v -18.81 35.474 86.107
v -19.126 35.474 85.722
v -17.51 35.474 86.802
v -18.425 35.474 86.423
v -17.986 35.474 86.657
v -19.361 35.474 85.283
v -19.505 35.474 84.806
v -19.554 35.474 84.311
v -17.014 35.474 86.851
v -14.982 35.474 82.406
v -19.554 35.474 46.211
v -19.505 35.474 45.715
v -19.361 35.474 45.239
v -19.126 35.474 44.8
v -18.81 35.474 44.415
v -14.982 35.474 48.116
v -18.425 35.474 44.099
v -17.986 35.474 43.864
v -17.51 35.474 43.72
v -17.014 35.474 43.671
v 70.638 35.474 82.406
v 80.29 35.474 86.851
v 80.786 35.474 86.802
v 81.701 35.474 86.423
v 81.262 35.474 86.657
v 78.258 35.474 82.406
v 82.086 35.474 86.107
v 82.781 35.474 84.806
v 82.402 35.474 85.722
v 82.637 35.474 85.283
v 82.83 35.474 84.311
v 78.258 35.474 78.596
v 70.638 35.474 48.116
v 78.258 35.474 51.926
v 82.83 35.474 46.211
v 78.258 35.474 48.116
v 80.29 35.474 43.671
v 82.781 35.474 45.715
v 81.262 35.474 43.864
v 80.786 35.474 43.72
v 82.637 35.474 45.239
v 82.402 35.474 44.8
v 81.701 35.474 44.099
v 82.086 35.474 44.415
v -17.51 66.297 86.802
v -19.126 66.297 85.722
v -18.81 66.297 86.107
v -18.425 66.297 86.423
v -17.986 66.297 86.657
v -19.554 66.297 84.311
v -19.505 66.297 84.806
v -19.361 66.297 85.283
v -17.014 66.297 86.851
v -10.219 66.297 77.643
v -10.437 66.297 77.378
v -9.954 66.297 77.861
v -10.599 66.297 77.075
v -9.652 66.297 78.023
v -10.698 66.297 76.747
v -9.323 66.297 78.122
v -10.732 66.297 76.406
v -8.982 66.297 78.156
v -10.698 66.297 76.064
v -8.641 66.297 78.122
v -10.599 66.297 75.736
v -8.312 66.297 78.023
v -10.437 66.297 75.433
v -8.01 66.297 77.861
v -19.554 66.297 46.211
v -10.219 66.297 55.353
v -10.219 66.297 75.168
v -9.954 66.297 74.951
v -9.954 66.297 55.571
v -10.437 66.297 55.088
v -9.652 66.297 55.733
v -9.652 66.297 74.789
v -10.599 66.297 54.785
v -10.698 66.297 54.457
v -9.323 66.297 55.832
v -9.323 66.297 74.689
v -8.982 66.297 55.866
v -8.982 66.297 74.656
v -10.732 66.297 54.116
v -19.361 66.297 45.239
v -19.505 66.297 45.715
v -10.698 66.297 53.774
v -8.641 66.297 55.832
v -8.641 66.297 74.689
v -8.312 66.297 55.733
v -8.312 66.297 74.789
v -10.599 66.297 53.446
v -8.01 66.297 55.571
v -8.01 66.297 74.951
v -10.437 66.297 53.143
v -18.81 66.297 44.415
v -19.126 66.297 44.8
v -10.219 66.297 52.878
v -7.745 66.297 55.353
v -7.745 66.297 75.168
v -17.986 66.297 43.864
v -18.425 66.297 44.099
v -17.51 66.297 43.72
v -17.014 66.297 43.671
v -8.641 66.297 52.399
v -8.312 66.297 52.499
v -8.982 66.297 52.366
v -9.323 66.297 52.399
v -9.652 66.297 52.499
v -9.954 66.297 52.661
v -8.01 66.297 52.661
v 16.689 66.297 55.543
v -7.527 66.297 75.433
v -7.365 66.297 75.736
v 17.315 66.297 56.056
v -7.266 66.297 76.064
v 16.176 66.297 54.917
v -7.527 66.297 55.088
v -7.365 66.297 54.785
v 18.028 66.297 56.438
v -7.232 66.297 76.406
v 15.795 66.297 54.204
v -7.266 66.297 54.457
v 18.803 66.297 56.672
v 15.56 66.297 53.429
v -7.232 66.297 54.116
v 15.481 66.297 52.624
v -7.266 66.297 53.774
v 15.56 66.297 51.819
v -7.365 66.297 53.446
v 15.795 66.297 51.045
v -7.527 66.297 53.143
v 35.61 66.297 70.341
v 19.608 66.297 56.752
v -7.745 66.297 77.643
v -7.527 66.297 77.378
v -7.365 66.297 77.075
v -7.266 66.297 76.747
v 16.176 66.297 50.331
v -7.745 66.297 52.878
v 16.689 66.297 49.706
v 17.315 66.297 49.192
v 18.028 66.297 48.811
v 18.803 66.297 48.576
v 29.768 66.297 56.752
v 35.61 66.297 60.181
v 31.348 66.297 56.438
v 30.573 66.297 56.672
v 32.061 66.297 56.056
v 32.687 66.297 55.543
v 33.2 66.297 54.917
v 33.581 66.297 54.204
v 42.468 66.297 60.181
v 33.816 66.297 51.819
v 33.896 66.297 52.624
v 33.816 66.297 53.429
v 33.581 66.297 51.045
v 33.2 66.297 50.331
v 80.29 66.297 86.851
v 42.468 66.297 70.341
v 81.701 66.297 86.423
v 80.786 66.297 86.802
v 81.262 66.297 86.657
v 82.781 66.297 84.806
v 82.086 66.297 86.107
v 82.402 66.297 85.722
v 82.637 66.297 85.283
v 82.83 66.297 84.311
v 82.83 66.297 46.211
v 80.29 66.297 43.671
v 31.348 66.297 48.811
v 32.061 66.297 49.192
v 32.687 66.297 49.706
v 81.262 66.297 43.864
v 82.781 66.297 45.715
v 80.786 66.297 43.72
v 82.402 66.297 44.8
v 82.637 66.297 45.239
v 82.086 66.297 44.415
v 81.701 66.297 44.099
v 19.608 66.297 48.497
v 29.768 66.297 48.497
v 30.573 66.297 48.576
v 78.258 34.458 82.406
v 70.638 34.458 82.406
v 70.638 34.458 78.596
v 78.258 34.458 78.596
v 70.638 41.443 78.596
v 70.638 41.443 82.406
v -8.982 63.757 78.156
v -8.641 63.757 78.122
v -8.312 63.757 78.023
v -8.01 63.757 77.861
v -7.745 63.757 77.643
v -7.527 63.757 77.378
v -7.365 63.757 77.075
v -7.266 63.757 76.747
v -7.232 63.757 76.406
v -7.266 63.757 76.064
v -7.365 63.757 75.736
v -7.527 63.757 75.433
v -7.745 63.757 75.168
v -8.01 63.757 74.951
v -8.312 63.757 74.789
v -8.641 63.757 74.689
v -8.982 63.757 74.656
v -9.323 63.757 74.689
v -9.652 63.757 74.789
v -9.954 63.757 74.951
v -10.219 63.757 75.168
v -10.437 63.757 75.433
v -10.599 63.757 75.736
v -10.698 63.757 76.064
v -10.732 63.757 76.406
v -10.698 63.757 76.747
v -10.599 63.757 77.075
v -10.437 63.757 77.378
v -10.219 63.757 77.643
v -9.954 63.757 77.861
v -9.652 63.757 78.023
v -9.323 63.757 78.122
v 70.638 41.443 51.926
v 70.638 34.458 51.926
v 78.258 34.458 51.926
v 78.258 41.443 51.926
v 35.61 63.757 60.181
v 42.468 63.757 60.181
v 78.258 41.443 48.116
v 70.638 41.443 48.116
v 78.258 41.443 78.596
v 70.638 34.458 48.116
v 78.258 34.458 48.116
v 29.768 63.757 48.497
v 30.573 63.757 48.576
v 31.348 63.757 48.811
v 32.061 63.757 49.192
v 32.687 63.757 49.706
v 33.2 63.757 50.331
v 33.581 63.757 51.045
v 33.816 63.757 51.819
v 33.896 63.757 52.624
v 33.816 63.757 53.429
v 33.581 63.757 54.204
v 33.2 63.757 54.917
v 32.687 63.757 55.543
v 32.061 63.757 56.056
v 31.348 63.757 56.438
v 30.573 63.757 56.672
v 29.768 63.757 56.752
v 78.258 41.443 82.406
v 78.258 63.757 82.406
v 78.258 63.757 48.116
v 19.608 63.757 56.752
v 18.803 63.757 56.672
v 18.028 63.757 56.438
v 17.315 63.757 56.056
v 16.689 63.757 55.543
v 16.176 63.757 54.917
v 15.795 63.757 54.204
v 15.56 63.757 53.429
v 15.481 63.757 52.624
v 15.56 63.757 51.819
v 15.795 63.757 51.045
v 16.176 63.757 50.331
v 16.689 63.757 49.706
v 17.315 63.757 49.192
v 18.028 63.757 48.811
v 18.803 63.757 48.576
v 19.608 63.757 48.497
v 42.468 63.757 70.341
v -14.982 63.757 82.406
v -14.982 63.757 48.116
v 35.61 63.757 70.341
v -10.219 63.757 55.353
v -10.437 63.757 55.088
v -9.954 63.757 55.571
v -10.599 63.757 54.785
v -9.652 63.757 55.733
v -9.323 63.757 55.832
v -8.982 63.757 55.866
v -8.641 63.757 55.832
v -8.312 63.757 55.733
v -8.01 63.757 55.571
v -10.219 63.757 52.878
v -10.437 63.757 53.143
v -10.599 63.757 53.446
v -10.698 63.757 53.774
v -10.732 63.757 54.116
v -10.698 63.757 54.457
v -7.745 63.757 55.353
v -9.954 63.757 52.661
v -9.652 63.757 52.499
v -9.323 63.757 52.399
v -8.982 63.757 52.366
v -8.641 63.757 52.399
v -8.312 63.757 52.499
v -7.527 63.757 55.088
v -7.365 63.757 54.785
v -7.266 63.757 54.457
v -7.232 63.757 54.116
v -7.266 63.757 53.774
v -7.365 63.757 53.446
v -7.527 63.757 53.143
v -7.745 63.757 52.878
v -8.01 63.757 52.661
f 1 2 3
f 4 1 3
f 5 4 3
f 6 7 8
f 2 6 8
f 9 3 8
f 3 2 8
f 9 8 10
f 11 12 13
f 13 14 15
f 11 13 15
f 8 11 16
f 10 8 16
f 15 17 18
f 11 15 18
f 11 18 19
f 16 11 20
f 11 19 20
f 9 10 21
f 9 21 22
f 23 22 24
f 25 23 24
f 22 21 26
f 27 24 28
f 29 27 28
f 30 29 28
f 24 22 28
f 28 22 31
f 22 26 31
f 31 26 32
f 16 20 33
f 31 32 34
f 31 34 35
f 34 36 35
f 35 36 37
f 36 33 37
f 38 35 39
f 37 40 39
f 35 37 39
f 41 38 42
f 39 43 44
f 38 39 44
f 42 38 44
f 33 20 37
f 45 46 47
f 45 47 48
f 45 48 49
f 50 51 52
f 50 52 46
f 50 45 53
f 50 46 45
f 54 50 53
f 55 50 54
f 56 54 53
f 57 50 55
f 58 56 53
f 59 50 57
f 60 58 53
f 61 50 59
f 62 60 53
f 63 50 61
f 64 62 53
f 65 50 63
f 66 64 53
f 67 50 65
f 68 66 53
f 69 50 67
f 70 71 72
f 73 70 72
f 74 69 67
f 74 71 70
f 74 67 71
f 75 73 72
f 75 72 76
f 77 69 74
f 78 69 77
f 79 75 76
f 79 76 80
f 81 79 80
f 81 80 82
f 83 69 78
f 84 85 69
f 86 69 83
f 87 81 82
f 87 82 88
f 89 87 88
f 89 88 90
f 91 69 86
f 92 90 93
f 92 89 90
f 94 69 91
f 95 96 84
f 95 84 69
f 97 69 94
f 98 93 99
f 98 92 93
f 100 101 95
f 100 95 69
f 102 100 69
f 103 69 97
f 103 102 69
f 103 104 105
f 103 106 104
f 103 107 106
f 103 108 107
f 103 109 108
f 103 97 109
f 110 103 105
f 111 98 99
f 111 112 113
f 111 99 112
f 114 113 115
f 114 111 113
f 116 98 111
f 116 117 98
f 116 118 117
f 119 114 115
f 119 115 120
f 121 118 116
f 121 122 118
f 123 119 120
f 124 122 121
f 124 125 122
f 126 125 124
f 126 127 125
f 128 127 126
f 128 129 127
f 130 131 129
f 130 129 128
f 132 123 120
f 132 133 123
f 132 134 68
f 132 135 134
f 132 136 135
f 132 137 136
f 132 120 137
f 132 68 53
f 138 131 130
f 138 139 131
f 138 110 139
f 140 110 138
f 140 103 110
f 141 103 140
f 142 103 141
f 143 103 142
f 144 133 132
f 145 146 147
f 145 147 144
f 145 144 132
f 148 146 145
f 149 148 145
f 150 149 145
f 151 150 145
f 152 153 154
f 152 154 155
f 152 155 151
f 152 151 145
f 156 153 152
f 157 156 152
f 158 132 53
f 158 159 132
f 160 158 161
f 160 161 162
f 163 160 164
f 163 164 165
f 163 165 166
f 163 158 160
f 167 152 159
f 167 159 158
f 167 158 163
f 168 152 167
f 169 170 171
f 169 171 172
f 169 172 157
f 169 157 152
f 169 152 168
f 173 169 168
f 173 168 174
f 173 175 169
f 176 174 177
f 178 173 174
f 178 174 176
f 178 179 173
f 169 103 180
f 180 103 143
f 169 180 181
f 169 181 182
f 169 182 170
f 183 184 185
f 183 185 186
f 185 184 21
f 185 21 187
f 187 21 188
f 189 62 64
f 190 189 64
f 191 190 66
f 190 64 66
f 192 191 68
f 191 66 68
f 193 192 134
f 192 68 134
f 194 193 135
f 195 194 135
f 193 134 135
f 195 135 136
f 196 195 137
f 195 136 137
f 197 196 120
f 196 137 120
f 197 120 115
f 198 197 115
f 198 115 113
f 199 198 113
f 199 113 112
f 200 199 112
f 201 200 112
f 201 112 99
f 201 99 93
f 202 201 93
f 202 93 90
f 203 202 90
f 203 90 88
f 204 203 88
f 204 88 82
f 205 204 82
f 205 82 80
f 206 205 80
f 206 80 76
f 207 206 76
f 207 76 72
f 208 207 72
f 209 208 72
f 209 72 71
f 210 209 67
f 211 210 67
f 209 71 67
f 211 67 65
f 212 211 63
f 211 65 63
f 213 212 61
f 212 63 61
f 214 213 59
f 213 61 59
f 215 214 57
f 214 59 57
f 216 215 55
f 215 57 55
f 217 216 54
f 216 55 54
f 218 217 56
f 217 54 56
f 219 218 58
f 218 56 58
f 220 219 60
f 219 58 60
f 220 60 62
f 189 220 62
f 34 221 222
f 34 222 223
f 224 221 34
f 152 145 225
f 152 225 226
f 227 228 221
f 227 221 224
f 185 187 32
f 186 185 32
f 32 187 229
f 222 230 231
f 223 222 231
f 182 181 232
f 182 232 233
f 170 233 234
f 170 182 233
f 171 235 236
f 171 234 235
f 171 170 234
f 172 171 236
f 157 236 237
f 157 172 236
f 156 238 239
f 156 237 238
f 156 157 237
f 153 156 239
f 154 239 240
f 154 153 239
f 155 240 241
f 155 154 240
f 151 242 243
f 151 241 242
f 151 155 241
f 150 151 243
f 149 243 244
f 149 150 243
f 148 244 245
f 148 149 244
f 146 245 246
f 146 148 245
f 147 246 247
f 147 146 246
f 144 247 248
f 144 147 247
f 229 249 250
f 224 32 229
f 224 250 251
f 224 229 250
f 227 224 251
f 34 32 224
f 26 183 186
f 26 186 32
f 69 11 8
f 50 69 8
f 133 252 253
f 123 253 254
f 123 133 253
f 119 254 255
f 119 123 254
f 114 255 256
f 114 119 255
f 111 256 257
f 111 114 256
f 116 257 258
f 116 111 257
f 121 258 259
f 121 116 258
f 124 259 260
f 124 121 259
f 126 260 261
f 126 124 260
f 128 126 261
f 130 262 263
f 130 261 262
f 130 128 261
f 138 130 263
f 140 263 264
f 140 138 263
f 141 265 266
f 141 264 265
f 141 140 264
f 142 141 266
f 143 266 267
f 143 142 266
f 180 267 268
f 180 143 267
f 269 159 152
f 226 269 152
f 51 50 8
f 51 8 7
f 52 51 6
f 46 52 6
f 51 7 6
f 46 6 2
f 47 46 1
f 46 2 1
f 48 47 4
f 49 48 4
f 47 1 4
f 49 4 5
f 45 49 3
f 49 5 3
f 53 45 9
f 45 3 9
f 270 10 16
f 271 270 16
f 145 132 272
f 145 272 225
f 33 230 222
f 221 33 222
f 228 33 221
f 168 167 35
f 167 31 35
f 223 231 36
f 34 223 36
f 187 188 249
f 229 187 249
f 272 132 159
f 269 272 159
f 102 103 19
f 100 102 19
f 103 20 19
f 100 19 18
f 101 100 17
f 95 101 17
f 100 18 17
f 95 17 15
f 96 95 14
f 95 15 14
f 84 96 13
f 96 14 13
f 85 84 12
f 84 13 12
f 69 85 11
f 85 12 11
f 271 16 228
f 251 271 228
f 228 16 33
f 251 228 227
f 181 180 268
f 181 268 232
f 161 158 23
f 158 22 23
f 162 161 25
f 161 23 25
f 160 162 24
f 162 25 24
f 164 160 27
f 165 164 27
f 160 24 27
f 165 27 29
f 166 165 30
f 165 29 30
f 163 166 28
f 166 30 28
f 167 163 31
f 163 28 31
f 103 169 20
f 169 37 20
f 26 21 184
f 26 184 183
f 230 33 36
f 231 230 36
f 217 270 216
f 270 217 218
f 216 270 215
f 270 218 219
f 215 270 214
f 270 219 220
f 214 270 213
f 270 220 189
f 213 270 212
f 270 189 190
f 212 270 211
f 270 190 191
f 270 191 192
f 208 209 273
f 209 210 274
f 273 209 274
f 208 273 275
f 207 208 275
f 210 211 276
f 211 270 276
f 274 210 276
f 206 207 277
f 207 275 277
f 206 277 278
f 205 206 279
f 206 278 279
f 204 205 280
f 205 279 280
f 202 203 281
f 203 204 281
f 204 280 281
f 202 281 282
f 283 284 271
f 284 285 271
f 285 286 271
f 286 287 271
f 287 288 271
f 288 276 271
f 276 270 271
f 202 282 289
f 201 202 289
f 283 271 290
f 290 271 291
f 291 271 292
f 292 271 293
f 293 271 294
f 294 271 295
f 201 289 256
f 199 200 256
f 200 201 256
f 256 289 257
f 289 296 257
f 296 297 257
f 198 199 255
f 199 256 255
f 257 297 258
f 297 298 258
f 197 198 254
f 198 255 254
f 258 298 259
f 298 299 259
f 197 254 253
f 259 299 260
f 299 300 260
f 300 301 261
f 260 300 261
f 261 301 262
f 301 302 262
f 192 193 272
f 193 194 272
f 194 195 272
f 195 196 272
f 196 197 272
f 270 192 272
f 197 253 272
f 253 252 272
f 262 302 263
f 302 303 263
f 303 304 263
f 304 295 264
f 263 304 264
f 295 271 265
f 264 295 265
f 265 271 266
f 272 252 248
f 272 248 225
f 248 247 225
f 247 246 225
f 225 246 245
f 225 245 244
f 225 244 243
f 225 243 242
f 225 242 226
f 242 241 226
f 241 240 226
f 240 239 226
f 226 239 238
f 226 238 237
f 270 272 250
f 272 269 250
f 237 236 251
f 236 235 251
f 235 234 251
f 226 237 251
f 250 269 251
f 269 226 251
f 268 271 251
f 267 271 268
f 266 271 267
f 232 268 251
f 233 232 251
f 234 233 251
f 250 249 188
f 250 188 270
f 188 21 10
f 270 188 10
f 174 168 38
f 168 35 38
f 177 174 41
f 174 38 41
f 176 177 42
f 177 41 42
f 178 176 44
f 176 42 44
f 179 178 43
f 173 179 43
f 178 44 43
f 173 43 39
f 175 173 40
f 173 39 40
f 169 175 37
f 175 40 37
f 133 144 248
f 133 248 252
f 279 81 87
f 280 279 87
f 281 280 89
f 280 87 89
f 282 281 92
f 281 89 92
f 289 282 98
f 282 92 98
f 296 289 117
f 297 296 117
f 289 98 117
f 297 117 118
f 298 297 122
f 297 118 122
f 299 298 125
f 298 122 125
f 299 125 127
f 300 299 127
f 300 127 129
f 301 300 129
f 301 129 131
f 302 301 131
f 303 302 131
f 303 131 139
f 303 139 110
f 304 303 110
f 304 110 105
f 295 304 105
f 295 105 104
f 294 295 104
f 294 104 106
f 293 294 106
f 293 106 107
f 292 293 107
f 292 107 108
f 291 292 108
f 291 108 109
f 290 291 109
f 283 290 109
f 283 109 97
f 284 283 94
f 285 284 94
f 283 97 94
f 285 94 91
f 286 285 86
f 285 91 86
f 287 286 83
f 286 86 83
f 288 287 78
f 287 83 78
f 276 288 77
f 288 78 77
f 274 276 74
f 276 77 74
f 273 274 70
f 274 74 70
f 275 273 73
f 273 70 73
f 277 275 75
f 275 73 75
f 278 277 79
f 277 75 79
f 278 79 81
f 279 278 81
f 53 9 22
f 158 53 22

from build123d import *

# Parameters (mm, degrees)
BOSS_EXTRUDE1_DEPTH = 28.2829
BOSS_EXTRUDE2_DEPTH = 2.54
CUT_EXTRUDE1_REACH  = 125.911
SKETCH3_R           = 1.75
SKETCH4_W           = 7.62
SKETCH4_H           = 6.985
BOSS_EXTRUDE3_DEPTH = 3.81
CUT_EXTRUDE2_REACH  = 126.168
SKETCH6_W           = 6.858000092
SKETCH6_H           = 10.16
CUT_EXTRUDE3_REACH  = 126.168


with BuildPart() as part:
    # Sketch1 → Boss-Extrude1 (new body)
    with BuildSketch(Plane(origin=(0, 35.474386892, 0), x_dir=(1, 0, 0), z_dir=(0, 1, 0))):
        with BuildLine():
            Line((-17.013975249, -86.850733206), (80.290024751, -86.850733206))
            ThreePointArc((80.290024751, -86.850733206), (82.086075975, -86.10678443), (82.830024751, -84.310733206))
            Line((82.830024751, -84.310733206), (82.830024751, -46.210733206))
            ThreePointArc((82.830024751, -46.210733206), (82.086075975, -44.414681982), (80.290024751, -43.670733206))
            Line((80.290024751, -43.670733206), (-17.013975249, -43.670733206))
            ThreePointArc((-17.013975249, -43.670733206), (-18.810026474, -44.414681982), (-19.553975249, -46.210733206))
            Line((-19.553975249, -46.210733206), (-19.553975249, -84.310733206))
            ThreePointArc((-19.553975249, -84.310733206), (-18.810026474, -86.10678443), (-17.013975249, -86.850733206))
        make_face()
        Polygon((78.258024751, -82.405733206), (78.258024751, -48.115733206), (-6.791975249, -48.115733206), (-11.171975249, -48.115733206), (-14.981975249, -48.115733206), (-14.981975249, -51.115733206), (-14.981975249, -54.115733206), (-14.981975249, -76.405733206), (-14.981975249, -79.405733206), (-14.981975249, -82.405733206), (-11.171975249, -82.405733206), (-6.791975249, -82.405733206), align=None, mode=Mode.SUBTRACT)
    extrude(amount=BOSS_EXTRUDE1_DEPTH)

    # Sketch2 → Boss-Extrude2 (add)
    with BuildSketch(Plane(origin=(0, 63.757286892, 0), x_dir=(1, 0, 0), z_dir=(0, 1, 0))):
        with BuildLine():
            Line((-17.013975249, -86.850733206), (80.290024751, -86.850733206))
            ThreePointArc((80.290024751, -86.850733206), (82.086075975, -86.10678443), (82.830024751, -84.310733206))
            Line((82.830024751, -84.310733206), (82.830024751, -46.210733206))
            ThreePointArc((82.830024751, -46.210733206), (82.086075975, -44.414681982), (80.290024751, -43.670733206))
            Line((80.290024751, -43.670733206), (-17.013975249, -43.670733206))
            ThreePointArc((-17.013975249, -43.670733206), (-18.810026474, -44.414681982), (-19.553975249, -46.210733206))
            Line((-19.553975249, -46.210733206), (-19.553975249, -84.310733206))
            ThreePointArc((-19.553975249, -84.310733206), (-18.810026474, -86.10678443), (-17.013975249, -86.850733206))
        make_face()
    extrude(amount=BOSS_EXTRUDE2_DEPTH)

    # Sketch3 → Cut-Extrude1 (cut, up to next)
    with BuildSketch(Plane(origin=(0, 66.297286892, 0), x_dir=(1, 0, 0), z_dir=(0, 1, 0)), mode=Mode.PRIVATE) as cut_extrude1_sk1:
        with Locations(Location((-8.981975249, -54.115733206, 0), (0, 0, 270))):
            Circle(SKETCH3_R)
    cut_extrude1_tool1 = extrude(cut_extrude1_sk1.sketch, amount=-CUT_EXTRUDE1_REACH, mode=Mode.PRIVATE) & part.part
    # Sketch3 → Cut-Extrude1 (cut, up to next)
    with BuildSketch(Plane(origin=(0, 66.297286892, 0), x_dir=(1, 0, 0), z_dir=(0, 1, 0)), mode=Mode.PRIVATE) as cut_extrude1_sk2:
        with Locations(Location((-8.981975249, -76.405733206, 0), (0, 0, 270))):
            Circle(SKETCH3_R)
    cut_extrude1_tool2 = extrude(cut_extrude1_sk2.sketch, amount=-CUT_EXTRUDE1_REACH, mode=Mode.PRIVATE) & part.part
    add(cut_extrude1_tool1.solids().sort_by_distance((-8.981975, 66.297287, 54.115733))[0], mode=Mode.SUBTRACT)
    add(cut_extrude1_tool2.solids().sort_by_distance((-8.981975, 66.297287, 76.405733))[0], mode=Mode.SUBTRACT)

    # Sketch4 → Boss-Extrude3 (add)
    with BuildSketch(Plane.XY.offset(48.115733206)):
        with Locations((74.448024751, 37.950886892)):
            Rectangle(SKETCH4_W, SKETCH4_H)
    boss_extrude3 = extrude(amount=BOSS_EXTRUDE3_DEPTH)

    # Mirror1: Boss-Extrude3 across plane
    add(boss_extrude3.mirror(Plane.XY.offset(65.260733206)))

    # Sketch6 → Cut-Extrude2 (cut, up to next)
    with BuildSketch(Plane(origin=(0, 66.297286892, 0), x_dir=(1, 0, 0), z_dir=(0, 1, 0)), mode=Mode.PRIVATE) as cut_extrude2_sk1:
        with Locations((39.039024705, -65.260733206)):
            Rectangle(SKETCH6_W, SKETCH6_H)
    cut_extrude2_tool1 = extrude(cut_extrude2_sk1.sketch, amount=-CUT_EXTRUDE2_REACH, mode=Mode.PRIVATE) & part.part
    add(cut_extrude2_tool1.solids().sort_by_distance((39.039025, 66.297287, 65.260733))[0], mode=Mode.SUBTRACT)

    # Sketch7 → Cut-Extrude3 (cut, up to next)
    with BuildSketch(Plane(origin=(0, 66.297286892, 0), x_dir=(1, 0, 0), z_dir=(0, 1, 0)), mode=Mode.PRIVATE) as cut_extrude3_sk1:
        with BuildLine():
            Line((29.768024751, -56.751733206), (19.608024751, -56.751733206))
            ThreePointArc((19.608024751, -56.751733206), (15.480524751, -52.624233206), (19.608024751, -48.496733206))
            Line((19.608024751, -48.496733206), (29.768024751, -48.496733206))
            ThreePointArc((29.768024751, -48.496733206), (33.895524751, -52.624233206), (29.768024751, -56.751733206))
        make_face()
    cut_extrude3_tool1 = extrude(cut_extrude3_sk1.sketch, amount=-CUT_EXTRUDE3_REACH, mode=Mode.PRIVATE) & part.part
    add(cut_extrude3_tool1.solids().sort_by_distance((24.688025, 66.297287, 52.624233))[0], mode=Mode.SUBTRACT)


solid = part.part
